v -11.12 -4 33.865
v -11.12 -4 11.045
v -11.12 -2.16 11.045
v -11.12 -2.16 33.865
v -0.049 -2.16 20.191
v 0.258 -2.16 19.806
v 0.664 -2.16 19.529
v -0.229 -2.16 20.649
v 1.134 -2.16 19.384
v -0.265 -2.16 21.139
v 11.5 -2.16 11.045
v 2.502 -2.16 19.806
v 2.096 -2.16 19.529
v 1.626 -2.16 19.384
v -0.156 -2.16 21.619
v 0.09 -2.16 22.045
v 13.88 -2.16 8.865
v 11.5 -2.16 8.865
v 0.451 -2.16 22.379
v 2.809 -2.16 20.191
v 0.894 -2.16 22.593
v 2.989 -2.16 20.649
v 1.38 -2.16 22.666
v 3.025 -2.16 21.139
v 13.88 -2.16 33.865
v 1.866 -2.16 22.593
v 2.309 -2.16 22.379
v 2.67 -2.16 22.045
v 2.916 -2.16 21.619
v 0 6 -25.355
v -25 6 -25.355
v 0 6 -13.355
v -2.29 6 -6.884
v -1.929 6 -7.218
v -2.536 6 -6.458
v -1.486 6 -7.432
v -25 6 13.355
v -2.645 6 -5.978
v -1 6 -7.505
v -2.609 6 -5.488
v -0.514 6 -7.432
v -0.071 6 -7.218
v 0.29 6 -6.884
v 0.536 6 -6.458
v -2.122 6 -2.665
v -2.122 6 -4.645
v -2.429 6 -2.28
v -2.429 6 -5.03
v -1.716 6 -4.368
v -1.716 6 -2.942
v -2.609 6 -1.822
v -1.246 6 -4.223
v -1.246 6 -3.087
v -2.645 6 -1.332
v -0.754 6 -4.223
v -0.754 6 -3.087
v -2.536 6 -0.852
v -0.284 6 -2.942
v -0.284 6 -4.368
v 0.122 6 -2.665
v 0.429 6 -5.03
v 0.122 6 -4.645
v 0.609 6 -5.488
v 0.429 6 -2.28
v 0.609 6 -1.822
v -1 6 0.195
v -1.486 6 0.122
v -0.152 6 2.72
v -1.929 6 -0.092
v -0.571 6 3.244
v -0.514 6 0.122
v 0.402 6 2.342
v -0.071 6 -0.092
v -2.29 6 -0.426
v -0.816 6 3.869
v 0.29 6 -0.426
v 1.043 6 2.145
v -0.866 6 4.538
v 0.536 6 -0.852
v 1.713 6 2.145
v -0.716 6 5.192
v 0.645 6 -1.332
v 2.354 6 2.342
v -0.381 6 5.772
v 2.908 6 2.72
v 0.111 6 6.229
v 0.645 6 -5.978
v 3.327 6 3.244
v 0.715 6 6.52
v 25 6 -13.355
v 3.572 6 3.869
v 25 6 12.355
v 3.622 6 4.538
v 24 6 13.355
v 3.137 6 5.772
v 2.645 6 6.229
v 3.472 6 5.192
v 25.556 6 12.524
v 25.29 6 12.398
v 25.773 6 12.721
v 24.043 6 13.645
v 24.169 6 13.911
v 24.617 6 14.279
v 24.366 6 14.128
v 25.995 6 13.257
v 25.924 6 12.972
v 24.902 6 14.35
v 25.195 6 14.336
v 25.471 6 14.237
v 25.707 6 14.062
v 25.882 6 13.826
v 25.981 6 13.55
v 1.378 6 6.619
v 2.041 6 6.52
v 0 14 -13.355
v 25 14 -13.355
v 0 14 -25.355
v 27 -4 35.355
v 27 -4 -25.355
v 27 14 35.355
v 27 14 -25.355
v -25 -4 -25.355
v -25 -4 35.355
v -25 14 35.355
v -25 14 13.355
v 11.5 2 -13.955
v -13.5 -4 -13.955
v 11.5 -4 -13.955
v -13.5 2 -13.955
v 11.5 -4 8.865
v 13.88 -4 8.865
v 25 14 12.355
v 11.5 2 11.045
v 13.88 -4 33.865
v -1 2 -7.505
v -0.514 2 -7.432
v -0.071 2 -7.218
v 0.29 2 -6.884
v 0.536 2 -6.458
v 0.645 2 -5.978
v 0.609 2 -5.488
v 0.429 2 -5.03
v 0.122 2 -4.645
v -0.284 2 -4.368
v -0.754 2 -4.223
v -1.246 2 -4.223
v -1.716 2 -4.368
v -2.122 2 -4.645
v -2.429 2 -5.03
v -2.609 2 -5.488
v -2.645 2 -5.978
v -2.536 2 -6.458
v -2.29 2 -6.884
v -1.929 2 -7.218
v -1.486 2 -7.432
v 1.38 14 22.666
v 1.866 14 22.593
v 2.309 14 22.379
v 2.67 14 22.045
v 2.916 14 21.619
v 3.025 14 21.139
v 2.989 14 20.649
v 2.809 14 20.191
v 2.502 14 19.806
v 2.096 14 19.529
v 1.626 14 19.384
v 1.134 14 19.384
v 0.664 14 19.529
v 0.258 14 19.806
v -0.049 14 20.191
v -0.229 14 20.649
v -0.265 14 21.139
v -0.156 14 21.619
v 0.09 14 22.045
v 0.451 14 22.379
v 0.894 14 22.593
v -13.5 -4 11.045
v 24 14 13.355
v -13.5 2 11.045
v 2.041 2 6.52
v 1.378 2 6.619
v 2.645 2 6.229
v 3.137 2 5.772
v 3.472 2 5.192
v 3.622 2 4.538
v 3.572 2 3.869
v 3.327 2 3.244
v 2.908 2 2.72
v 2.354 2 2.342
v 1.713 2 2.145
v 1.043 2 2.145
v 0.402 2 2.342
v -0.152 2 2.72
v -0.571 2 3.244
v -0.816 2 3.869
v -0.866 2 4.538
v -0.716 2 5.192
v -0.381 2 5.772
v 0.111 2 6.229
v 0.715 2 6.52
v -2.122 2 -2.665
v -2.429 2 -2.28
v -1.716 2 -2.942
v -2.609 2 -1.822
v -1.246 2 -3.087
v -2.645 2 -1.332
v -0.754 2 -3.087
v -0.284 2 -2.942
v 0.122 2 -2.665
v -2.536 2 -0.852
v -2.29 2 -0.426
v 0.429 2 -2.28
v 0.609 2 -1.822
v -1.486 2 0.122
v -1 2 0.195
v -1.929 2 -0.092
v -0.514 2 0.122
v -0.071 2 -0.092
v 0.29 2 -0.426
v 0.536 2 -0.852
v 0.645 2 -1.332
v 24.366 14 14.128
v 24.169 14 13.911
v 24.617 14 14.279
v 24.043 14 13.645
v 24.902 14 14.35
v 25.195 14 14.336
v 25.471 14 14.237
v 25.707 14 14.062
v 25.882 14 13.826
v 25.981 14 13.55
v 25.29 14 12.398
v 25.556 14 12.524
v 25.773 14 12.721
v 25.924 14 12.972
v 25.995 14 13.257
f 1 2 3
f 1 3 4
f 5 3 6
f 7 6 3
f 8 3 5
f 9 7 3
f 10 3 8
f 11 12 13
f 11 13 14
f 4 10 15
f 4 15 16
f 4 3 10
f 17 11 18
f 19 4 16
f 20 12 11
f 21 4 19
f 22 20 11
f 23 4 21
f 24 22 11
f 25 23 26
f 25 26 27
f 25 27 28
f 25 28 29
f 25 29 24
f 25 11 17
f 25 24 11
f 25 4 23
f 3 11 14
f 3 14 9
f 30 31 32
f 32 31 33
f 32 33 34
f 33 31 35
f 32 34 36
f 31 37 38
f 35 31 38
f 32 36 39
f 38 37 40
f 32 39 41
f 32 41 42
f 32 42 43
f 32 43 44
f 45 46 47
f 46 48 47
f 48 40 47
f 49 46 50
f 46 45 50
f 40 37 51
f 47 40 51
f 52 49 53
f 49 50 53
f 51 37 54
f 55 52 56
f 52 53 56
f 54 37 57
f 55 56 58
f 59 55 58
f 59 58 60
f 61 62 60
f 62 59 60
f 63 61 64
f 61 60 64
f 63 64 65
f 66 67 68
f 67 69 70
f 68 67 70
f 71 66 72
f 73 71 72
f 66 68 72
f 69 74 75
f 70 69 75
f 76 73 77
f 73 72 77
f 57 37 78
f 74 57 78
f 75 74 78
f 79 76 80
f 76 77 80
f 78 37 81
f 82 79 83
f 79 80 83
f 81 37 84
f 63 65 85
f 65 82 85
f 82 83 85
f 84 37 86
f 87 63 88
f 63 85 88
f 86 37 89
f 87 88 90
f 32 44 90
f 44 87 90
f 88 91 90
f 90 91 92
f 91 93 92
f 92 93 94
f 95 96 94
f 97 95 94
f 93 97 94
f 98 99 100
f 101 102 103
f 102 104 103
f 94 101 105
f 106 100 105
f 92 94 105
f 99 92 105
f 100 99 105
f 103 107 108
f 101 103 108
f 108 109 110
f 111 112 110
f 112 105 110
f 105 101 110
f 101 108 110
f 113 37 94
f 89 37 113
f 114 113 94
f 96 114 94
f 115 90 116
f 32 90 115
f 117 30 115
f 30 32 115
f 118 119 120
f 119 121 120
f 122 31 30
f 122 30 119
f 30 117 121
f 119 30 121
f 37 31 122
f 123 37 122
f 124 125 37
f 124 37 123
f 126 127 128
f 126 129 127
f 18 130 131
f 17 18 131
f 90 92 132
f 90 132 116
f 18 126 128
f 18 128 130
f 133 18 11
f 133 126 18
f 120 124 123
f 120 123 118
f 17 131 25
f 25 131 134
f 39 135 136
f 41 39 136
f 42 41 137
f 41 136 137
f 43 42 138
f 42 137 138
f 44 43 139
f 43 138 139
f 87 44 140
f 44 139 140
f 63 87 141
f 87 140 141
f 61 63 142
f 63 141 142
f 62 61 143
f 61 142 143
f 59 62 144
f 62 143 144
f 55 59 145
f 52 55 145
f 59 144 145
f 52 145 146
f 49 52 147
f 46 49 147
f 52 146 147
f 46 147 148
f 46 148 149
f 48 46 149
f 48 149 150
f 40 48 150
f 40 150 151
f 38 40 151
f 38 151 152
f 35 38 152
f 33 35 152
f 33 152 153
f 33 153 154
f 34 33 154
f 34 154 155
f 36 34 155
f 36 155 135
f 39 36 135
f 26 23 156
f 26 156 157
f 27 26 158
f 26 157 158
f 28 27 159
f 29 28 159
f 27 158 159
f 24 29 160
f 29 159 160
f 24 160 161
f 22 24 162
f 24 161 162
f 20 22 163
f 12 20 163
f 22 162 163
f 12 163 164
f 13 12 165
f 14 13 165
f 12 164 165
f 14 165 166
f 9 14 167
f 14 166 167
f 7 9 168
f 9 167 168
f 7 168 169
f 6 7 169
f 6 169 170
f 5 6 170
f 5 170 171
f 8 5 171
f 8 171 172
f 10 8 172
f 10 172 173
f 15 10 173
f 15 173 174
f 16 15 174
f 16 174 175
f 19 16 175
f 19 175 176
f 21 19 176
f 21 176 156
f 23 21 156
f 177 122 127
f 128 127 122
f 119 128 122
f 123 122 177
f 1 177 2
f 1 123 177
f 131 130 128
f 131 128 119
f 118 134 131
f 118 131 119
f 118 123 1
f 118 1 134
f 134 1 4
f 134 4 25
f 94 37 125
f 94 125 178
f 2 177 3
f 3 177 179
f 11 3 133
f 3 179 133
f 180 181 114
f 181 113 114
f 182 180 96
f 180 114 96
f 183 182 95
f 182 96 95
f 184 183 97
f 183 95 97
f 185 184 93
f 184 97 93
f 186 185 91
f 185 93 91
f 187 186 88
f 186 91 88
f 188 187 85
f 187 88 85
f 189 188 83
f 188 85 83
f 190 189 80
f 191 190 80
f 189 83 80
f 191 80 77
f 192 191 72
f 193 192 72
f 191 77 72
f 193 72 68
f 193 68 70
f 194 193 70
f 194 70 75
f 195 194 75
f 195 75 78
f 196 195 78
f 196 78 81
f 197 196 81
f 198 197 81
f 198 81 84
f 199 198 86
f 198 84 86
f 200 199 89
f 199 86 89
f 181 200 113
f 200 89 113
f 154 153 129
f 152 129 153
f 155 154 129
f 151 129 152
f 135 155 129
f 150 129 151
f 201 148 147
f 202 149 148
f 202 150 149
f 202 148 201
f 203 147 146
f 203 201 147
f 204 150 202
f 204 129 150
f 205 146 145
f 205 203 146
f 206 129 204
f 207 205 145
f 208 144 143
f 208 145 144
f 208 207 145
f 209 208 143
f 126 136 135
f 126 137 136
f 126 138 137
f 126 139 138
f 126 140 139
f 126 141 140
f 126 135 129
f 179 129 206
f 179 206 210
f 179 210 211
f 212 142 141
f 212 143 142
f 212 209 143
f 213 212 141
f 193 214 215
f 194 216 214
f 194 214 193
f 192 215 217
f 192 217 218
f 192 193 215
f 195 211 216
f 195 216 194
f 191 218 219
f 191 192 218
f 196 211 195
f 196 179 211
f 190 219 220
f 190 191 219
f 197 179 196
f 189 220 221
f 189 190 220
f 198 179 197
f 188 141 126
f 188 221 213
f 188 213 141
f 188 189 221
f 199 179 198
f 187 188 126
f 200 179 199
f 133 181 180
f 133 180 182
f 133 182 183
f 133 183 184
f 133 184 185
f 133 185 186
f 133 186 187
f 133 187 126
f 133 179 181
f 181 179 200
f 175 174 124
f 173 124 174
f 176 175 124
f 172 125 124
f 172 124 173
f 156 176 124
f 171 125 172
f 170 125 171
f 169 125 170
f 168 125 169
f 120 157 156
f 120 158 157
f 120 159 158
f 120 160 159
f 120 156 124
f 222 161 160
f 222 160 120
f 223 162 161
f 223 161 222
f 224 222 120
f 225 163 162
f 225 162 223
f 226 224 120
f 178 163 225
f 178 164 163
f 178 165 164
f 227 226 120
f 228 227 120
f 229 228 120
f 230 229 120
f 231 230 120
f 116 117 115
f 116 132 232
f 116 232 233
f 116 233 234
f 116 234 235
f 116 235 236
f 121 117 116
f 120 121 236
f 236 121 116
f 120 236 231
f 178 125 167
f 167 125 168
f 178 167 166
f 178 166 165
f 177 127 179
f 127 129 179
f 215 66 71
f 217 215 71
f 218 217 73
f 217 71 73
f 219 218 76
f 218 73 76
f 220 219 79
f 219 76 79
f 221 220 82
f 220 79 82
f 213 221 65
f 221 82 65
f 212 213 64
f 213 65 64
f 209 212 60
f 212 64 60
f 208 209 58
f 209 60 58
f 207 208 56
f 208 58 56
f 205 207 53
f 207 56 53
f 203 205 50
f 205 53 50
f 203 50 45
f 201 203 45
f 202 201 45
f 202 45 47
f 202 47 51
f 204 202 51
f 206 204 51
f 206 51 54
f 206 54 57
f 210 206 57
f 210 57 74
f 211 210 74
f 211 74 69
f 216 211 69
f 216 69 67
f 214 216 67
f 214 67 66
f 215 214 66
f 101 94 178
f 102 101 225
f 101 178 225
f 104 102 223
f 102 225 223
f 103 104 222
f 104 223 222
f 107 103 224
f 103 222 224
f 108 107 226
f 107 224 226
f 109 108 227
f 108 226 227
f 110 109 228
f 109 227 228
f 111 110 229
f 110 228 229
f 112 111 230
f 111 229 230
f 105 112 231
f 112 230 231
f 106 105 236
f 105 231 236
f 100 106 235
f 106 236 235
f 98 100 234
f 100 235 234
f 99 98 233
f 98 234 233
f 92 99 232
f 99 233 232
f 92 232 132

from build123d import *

# Parameters (mm, degrees)
SKETCH_1_W                = 50
SKETCH_1_H                = 26.71
EXTRUDE_1_DEPTH           = 6
EXTRUDE_2_DEPTH           = 8
EXTRUDE_2_DEPTH_BACK      = 6
HOLE_WIZARD_M4_1_D        = 3.3
HOLE_WIZARD_M4_1_DEPTH    = 10.1
HOLE_WIZARD_M4_1_TIP      = 0.991420021
SKETCH_12_W               = 2
SKETCH_12_H               = 8
CUT_EXTRUDE_5_DEPTH       = 25
EXTRUDE_5_DEPTH           = 10
SKETCH_25_W               = 52
SKETCH_25_H               = 14
EXTRUDE_6_DEPTH           = 20
SKETCH_13_R               = 1
CUT_EXTRUDE_6_DEPTH       = 8
SKETCH_5_W                = 25
SKETCH_5_H                = 25
SKETCH_5_R                = 1.193891983
CUT_EXTRUDE_1_DEPTH       = 2
HOLE_WIZARD_M4_2_D        = 3.3
SKETCH_14_W               = 52
SKETCH_14_H               = 60.71
SKETCH_14_W_2             = 25
SKETCH_14_H_2             = 25
EXTRUDE_3_DEPTH           = 4
SKETCH_16_W               = 25
SKETCH_16_H               = 25
CUT_EXTRUDE_7_DEPTH       = 1.84
HOLE_WIZARD_0_D           = 4.5
HOLE_WIZARD_0_CBORE_D     = 8
HOLE_WIZARD_0_CBORE_DEPTH = 4.6
HOLE_WIZARD_M4_3_D        = 3.3


with BuildPart() as part:
    # 草图1 → 凸台-拉伸1 (new body)
    with BuildSketch(Plane(origin=(0, 0, 0), x_dir=(1, 0, 0), z_dir=(0, 1, 0))):
        Rectangle(SKETCH_1_W, SKETCH_1_H)
    extrude(amount=EXTRUDE_1_DEPTH)

    # 草图2 → 凸台-拉伸2 (add, two sides: drawn at the far end of the back side and taken through both)
    with BuildSketch(Plane(origin=(0, 6, 0), x_dir=(1, 0, 0), z_dir=(0, 1, 0)).offset(-EXTRUDE_2_DEPTH_BACK)):
        Polygon((25, 13.355), (-25, 13.355), (-25, 15.355), (27, 15.355), (27, -15.355), (-25, -15.355), (-25, -13.355), (25, -13.355), align=None)
    extrude(amount=EXTRUDE_2_DEPTH + EXTRUDE_2_DEPTH_BACK)

    # M4 螺纹孔1
    with Locations(Plane(origin=(-1, 6, -5.855), x_dir=(0, 0, 1), z_dir=(0, 1, 0))):
        with Locations((0, 0)):
            Hole(HOLE_WIZARD_M4_1_D / 2, depth=HOLE_WIZARD_M4_1_DEPTH)
            with Locations((0, 0, -(HOLE_WIZARD_M4_1_DEPTH + HOLE_WIZARD_M4_1_TIP / 2))):  # 118° drill point
                Cone(0, HOLE_WIZARD_M4_1_D / 2, HOLE_WIZARD_M4_1_TIP, mode=Mode.SUBTRACT)

    # 草图12 → 切除-拉伸5 (cut)
    with BuildSketch(Plane.ZY.offset(25)):
        with Locations((-14.355, 10)):
            Rectangle(SKETCH_12_W, SKETCH_12_H)
    extrude(amount=-CUT_EXTRUDE_5_DEPTH, mode=Mode.SUBTRACT)

    # 草图24 → 凸台-拉伸5 (add)
    with BuildSketch(Plane(origin=(0, 0, -15.355), x_dir=(-1, 0, 0), z_dir=(0, 0, -1))):
        Polygon((25, 6), (0, 6), (0, 14), (-27, 14), (-27, 0), (25, 0), align=None)
    extrude(amount=EXTRUDE_5_DEPTH)

    # 草图25 → 凸台-拉伸6 (add)
    with BuildSketch(Plane.XY.offset(15.355)):
        with Locations((1, 7)):
            Rectangle(SKETCH_25_W, SKETCH_25_H)
    extrude(amount=EXTRUDE_6_DEPTH)

    # 草图13 → 切除-拉伸6 (cut)
    with BuildSketch(Plane(origin=(0, 14, 0), x_dir=(1, 0, 0), z_dir=(0, 1, 0))):
        with Locations((25, -13.355)):
            Circle(SKETCH_13_R)
    extrude(amount=-CUT_EXTRUDE_6_DEPTH, mode=Mode.SUBTRACT)

    # 草图5 → 切除-拉伸1 (cut)
    with BuildSketch(Plane.XZ):
        with Locations((-1, -1.455)):
            Rectangle(SKETCH_5_W, SKETCH_5_H)
        with Locations(Location((-1, -1.455, 0), (0, 0, 270))):
            Circle(SKETCH_5_R, mode=Mode.SUBTRACT)
    extrude(amount=-CUT_EXTRUDE_1_DEPTH, mode=Mode.SUBTRACT)

    # M4 螺纹孔2 (through all)
    with Locations(Plane(origin=(-1, 2, -1.455), x_dir=(0, 0, -1), z_dir=(0, -1, 0))):
        with Locations((0, 0)):
            Hole(HOLE_WIZARD_M4_2_D / 2)

    # 草图14 → 凸台-拉伸3 (add)
    with BuildSketch(Plane.XZ):
        with Locations((1, 5)):
            Rectangle(SKETCH_14_W, SKETCH_14_H)
        with Locations((-1, -1.455)):
            Rectangle(SKETCH_14_W_2, SKETCH_14_H_2, mode=Mode.SUBTRACT)
    extrude(amount=EXTRUDE_3_DEPTH)

    # 草图16 → 切除-拉伸7 (cut)
    with BuildSketch(Plane.XZ.offset(4)):
        with Locations((1.38, 21.365)):
            Rectangle(SKETCH_16_W, SKETCH_16_H)
    extrude(amount=-CUT_EXTRUDE_7_DEPTH, mode=Mode.SUBTRACT)

    # 打孔尺寸(%根据)内六角圆柱头螺钉的类型0 (through all)
    with Locations(Plane(origin=(1.378, -4, 4.369489244), x_dir=(0, 0, -1), z_dir=(0, -1, 0))):
        with Locations((0, 0)):
            CounterBoreHole(HOLE_WIZARD_0_D / 2, HOLE_WIZARD_0_CBORE_D / 2, HOLE_WIZARD_0_CBORE_DEPTH)

    # M4 螺纹孔3 (through all)
    with Locations(Plane(origin=(1.38, -2.16, 21.015906409), x_dir=(0, 0, -1), z_dir=(0, -1, 0))):
        with Locations((0, 0)):
            Hole(HOLE_WIZARD_M4_3_D / 2)


solid = part.part
